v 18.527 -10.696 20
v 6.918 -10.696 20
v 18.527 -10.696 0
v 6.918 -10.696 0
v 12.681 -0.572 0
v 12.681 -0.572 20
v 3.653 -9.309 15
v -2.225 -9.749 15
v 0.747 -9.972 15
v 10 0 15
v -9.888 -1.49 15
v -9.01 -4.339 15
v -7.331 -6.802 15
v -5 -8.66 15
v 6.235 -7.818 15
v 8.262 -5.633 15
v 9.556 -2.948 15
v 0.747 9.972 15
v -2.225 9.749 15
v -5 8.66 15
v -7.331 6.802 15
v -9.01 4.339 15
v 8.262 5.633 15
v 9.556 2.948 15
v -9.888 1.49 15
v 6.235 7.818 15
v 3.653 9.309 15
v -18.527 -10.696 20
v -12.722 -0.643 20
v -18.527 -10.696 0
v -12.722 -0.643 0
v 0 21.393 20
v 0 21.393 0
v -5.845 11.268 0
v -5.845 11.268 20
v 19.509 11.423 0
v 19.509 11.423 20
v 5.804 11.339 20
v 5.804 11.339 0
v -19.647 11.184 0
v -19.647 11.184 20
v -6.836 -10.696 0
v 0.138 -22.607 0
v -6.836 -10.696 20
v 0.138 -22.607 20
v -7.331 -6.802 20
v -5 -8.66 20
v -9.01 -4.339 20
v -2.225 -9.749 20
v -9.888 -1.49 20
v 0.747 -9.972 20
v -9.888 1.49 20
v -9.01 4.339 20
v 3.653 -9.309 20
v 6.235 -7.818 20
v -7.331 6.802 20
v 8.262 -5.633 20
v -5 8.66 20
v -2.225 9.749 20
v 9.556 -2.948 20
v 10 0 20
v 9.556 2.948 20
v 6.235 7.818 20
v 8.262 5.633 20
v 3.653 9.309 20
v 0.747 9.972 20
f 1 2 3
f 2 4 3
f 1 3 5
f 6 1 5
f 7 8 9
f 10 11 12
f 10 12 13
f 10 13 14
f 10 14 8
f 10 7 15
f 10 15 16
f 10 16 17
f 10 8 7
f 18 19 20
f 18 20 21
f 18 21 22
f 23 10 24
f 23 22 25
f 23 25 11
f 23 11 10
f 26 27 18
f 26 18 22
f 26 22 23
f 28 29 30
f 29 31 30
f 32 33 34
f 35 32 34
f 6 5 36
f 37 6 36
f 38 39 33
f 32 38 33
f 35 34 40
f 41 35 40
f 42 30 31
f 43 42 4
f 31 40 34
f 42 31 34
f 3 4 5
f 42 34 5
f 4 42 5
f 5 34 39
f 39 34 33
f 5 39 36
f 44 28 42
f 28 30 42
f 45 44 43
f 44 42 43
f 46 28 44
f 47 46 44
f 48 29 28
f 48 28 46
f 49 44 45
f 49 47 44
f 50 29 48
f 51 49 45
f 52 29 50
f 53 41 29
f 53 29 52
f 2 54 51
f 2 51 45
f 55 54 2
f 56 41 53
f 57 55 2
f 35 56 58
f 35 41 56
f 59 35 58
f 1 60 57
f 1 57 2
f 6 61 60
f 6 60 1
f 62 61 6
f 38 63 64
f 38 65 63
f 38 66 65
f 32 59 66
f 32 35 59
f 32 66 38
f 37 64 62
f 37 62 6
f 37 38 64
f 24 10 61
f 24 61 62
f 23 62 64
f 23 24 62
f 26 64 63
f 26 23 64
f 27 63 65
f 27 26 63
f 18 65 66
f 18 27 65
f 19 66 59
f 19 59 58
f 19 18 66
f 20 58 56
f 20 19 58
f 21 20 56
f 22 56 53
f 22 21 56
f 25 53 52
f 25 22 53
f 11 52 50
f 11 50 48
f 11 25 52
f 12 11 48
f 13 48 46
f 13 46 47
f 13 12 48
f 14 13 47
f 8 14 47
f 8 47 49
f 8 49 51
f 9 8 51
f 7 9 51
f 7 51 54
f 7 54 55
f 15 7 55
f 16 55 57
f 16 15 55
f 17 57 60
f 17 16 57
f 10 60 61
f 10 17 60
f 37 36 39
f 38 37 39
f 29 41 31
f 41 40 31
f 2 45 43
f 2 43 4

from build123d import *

# Parameters (mm, degrees)
F1_DEPTH = 15
F2_R     = 10
F3_DEPTH = 5


with BuildPart() as f1:
    # F0 (on Top) → F1 (new body)
    with BuildSketch(Plane.XY):
        Polygon((-12.7223648903, -0.643178855), (-5.8452739672, 11.2682920321), (-19.6474669216, 11.1839482352), align=None)
        Polygon((0.0316754732, 11.3042054723), (-5.8452739672, 11.2682920321), (-12.7223648903, -0.643178855), (-6.8359901735, -10.6963017637), (0.1007524936, -10.6963017637), align=None)
        Polygon((0.0316754732, 11.3042054723), (0, 21.3926035274), (-5.8452739672, 11.2682920321), align=None)
        Polygon((5.8041732175, 11.3394806187), (0, 21.3926035274), (0.0316754732, 11.3042054723), align=None)
        Polygon((12.6812641407, -0.5719902684), (5.8041732175, 11.3394806187), (0.0316754732, 11.3042054723), (0.1007524936, -10.6963017637), (6.9181916728, -10.6963017637), align=None)
        Polygon((19.509316747, 11.4232313565), (5.8041732175, 11.3394806187), (12.6812641407, -0.5719902684), align=None)
        Polygon((18.5265381078, -10.6963017637), (12.6812641407, -0.5719902684), (6.9181916728, -10.6963017637), align=None)
        Polygon((0.1381501745, -22.6071795917), (0.1007524936, -10.6963017637), (-6.8359901735, -10.6963017637), align=None)
        Polygon((6.9181916728, -10.6963017637), (0.1007524936, -10.6963017637), (0.1381501745, -22.6071795917), align=None)
        Polygon((-6.8359901735, -10.6963017637), (-12.7223648903, -0.643178855), (-18.5265381078, -10.6963017637), align=None)
    extrude(amount=F1_DEPTH)

    # F2 (on face) → F3 (join)
    with BuildSketch(Plane.XY.offset(15)):
        Polygon((-5.8452739672, 11.2682920321), (-19.6474669216, 11.1839482352), (-12.7223648903, -0.643178855), (-18.5265381078, -10.6963017637), (-6.8359901735, -10.6963017637), (0.1381501745, -22.6071795917), (6.9181916728, -10.6963017637), (18.5265381078, -10.6963017637), (12.6812641407, -0.5719902684), (19.509316747, 11.4232313565), (5.8041732175, 11.3394806187), (0, 21.3926035274), align=None)
        Circle(F2_R, mode=Mode.SUBTRACT)
    extrude(amount=F3_DEPTH)


solid = f1.part
